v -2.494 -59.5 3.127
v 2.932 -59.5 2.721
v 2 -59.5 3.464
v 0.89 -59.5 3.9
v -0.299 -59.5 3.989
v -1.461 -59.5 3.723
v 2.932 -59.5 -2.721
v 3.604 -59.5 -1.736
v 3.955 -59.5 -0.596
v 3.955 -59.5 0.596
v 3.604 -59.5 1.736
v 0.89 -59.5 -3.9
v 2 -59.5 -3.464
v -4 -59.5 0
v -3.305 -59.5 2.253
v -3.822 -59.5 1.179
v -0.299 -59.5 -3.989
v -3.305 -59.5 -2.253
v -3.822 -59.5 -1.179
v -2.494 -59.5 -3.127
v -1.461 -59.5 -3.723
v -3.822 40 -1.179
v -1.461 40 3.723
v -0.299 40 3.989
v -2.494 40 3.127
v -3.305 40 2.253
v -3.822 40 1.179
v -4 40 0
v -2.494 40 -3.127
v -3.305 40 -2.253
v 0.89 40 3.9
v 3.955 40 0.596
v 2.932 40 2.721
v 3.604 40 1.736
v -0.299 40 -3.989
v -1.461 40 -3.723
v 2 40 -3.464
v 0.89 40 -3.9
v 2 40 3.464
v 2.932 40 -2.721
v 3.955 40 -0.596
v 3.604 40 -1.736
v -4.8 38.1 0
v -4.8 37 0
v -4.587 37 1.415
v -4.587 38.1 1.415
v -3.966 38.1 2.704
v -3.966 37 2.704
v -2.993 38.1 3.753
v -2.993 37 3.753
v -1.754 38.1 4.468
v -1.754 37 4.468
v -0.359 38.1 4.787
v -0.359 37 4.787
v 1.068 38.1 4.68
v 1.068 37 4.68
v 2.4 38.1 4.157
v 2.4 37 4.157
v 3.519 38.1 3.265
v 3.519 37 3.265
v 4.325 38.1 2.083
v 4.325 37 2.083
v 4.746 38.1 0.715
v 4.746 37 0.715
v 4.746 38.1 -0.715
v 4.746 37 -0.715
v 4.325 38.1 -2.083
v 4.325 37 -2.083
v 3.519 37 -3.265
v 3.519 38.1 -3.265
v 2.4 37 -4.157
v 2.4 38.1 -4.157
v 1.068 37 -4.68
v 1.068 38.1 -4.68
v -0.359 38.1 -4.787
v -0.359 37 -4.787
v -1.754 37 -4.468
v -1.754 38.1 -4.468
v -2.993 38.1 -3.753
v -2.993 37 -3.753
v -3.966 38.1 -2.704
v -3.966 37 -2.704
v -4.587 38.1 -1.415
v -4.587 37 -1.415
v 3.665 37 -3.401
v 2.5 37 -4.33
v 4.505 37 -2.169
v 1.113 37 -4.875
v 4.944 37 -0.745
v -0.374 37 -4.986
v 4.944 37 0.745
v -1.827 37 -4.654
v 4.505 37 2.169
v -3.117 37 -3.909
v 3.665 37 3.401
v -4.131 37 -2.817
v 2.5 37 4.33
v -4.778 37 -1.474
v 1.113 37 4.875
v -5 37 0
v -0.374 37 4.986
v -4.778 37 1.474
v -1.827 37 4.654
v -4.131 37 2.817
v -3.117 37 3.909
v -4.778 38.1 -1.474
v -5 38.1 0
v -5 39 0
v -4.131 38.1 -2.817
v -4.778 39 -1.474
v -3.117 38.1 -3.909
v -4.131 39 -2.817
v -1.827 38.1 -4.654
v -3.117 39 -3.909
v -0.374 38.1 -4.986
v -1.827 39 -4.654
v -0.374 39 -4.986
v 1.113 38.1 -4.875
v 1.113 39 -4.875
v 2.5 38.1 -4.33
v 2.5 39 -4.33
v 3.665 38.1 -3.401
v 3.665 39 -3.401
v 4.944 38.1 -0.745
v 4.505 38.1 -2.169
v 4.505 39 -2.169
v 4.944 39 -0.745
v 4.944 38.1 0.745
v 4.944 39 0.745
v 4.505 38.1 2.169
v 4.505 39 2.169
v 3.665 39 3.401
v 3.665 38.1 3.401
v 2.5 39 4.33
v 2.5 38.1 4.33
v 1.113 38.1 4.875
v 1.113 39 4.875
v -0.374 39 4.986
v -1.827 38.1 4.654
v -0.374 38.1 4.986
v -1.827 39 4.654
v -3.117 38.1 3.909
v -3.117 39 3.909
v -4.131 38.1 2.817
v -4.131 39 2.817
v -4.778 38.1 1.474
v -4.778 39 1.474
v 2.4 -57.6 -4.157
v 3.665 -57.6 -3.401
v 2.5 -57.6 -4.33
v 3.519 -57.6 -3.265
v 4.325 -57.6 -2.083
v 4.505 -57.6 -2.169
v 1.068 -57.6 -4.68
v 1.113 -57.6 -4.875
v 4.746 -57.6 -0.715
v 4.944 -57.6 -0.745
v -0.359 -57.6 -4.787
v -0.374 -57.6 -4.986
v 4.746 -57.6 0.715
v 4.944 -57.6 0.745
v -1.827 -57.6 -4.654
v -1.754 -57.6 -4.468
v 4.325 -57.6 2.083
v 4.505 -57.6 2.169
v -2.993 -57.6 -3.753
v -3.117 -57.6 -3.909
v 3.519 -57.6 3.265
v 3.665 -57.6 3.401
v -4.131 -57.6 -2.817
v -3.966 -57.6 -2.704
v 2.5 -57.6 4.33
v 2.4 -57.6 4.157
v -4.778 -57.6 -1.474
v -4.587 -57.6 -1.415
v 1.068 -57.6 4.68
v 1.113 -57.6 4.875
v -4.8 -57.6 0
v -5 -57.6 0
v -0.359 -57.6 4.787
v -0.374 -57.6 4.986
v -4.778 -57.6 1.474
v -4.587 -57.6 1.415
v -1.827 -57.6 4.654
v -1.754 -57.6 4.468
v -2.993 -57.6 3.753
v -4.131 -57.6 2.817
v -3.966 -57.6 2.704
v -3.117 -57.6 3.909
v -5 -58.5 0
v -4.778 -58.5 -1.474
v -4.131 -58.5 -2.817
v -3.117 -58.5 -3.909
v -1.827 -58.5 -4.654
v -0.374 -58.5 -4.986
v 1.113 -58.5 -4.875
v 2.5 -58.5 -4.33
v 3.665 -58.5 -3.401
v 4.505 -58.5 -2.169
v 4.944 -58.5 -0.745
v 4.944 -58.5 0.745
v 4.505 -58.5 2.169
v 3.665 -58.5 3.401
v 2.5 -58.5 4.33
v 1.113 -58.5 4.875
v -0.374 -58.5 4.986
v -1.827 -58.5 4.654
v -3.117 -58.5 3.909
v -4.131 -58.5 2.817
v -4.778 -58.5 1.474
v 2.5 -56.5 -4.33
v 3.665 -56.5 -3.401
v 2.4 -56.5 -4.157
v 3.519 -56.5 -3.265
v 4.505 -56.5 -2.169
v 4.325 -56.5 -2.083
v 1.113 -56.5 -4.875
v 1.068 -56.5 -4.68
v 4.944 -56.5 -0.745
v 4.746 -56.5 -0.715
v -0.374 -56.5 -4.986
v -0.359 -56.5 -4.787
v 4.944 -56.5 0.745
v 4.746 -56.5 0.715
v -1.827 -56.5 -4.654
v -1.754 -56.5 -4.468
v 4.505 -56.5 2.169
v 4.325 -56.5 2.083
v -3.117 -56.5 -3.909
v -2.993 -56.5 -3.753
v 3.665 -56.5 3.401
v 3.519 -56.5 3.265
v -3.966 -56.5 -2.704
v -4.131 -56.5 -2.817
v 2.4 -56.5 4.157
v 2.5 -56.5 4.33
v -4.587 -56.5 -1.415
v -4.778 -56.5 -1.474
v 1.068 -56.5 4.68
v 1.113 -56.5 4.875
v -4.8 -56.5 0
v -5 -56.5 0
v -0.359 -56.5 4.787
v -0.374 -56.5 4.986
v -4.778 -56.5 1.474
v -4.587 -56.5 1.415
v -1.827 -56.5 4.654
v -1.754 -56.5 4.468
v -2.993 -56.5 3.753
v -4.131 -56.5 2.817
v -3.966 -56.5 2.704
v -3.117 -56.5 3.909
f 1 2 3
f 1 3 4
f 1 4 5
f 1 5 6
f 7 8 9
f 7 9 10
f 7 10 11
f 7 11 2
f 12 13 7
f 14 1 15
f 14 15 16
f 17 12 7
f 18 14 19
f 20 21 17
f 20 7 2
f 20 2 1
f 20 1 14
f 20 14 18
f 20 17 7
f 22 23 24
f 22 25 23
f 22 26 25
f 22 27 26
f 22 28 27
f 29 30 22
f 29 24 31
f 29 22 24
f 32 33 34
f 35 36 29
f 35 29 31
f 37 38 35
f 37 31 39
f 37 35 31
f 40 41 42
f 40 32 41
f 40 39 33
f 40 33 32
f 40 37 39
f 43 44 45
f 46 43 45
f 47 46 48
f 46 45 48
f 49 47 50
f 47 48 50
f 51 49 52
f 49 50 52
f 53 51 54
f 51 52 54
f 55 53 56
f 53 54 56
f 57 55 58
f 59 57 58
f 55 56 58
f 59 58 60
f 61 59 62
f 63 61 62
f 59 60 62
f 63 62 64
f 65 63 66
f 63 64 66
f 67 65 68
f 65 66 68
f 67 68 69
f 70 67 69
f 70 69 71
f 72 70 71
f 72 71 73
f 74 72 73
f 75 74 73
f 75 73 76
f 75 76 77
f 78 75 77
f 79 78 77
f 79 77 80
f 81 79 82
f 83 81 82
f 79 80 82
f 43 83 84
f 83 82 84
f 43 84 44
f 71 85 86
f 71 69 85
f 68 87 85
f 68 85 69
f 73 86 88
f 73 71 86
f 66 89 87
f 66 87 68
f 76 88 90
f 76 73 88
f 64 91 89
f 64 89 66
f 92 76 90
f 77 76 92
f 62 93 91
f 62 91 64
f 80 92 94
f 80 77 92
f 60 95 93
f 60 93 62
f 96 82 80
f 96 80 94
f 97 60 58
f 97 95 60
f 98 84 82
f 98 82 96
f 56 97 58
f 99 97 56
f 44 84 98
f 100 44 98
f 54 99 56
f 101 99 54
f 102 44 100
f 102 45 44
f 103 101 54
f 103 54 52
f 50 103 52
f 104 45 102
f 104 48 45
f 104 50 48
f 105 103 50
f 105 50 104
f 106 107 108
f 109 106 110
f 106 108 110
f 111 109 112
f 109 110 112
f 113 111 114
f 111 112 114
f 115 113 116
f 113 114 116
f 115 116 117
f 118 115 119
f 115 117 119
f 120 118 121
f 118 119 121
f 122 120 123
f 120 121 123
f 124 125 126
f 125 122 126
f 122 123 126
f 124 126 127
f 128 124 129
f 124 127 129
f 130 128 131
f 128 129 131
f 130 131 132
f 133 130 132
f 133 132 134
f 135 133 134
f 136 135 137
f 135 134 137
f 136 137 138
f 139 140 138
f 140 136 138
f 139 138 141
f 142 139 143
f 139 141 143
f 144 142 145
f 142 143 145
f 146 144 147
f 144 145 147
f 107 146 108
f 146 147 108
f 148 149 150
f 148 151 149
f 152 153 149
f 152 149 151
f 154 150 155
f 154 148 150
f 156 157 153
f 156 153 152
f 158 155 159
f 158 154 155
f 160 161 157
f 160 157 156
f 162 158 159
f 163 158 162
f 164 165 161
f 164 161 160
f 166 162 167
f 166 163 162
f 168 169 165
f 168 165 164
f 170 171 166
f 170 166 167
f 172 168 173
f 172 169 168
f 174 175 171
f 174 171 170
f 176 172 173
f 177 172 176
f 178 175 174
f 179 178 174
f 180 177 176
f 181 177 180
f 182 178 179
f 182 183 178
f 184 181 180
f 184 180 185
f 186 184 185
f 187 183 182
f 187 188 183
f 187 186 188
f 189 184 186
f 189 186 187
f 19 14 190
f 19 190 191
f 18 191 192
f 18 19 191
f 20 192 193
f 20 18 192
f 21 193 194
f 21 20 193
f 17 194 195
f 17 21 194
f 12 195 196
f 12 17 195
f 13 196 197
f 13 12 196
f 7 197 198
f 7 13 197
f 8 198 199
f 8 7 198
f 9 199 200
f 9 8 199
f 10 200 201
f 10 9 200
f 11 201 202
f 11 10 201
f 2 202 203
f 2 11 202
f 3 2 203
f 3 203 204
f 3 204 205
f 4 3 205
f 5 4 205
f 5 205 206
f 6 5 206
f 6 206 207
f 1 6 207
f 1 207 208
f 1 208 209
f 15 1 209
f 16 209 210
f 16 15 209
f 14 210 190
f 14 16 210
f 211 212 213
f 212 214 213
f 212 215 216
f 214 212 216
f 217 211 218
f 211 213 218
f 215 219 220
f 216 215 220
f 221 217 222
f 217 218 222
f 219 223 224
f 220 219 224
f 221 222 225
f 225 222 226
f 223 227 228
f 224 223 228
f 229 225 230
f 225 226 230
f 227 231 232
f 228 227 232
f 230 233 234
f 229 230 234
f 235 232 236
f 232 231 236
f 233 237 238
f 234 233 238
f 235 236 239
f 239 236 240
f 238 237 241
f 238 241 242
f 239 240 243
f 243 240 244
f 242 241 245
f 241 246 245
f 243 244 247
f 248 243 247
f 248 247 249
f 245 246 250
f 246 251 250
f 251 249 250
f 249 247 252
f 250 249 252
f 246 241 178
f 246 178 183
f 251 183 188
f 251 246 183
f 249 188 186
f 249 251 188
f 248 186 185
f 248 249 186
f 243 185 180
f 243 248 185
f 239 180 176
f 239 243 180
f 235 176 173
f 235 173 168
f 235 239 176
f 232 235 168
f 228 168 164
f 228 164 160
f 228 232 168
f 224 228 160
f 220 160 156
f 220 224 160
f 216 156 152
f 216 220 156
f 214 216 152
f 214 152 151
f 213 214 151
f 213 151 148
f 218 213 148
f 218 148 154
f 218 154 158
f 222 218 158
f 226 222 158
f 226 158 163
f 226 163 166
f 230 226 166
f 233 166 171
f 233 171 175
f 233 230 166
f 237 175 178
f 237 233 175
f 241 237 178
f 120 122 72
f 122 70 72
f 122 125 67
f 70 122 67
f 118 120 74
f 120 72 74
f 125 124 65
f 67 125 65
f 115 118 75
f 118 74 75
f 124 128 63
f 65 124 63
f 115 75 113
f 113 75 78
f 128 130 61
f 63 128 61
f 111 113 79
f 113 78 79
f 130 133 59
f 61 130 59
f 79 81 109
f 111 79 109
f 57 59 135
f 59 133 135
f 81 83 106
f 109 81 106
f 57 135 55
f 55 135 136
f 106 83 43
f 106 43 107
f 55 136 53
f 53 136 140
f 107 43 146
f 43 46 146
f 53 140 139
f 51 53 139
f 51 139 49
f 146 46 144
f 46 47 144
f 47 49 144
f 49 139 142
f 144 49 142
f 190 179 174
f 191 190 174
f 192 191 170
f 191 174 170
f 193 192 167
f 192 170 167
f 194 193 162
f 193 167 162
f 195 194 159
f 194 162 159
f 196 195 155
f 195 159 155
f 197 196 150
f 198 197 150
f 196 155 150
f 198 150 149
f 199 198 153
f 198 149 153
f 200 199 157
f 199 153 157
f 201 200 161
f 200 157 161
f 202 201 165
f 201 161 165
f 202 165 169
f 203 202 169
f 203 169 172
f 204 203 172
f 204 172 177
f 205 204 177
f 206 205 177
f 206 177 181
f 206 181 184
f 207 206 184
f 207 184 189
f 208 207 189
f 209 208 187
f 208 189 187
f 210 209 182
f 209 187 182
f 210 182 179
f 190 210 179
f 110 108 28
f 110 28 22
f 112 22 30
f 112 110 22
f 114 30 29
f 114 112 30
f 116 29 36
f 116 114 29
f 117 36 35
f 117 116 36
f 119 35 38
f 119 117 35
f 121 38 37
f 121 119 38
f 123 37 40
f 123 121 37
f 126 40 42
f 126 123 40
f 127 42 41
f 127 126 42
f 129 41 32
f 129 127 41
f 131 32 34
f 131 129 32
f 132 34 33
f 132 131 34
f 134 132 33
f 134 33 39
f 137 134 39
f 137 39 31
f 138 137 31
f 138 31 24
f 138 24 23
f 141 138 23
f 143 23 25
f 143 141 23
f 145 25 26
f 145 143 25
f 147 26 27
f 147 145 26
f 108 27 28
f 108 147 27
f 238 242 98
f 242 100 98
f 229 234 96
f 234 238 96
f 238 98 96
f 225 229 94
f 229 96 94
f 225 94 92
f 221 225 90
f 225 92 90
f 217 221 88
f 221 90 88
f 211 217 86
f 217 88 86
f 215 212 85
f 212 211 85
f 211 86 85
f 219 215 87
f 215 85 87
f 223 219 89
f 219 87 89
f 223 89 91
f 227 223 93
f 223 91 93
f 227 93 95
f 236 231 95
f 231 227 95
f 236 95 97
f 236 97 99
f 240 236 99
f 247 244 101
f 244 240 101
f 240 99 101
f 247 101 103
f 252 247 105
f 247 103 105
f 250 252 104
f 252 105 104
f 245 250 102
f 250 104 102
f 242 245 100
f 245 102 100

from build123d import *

# Parameters (mm, degrees)
CHAMFER_1_SIZE      = 1
CUT_EXTRUDE_START   = -3
SKETCH_2_R          = 5
SKETCH_2_R_2        = 4.8
CUT_EXTRUDE_1_DEPTH = 1.1


with BuildPart() as part:
    # 草图1 → 旋转1 (revolve)
    with BuildSketch(Plane.XY, mode=Mode.PRIVATE) as revolve_1_sk:
        Polygon((0, 40), (5, 40), (5, 30), (5, -49.5), (5, -59.5), (0, -59.5), align=None)
    revolve(revolve_1_sk.sketch.rotate(Axis((0, 40, 0), (0, -1, 0)), 180), axis=Axis((0, 40, 0), (0, -1, 0)))

    # 倒角1
    chamfer_1_edges = [part.edges().sort_by_distance(p)[0] for p in [
        (5, -59.5, 0),
        (5, 40, 0),
    ]]
    chamfer(chamfer_1_edges, length=CHAMFER_1_SIZE)

    # 草图2 → 切除-拉伸1 (cut)
    with BuildSketch(Plane(origin=(0, 40, 0), x_dir=(1, 0, 0), z_dir=(0, 1, 0)).offset(CUT_EXTRUDE_START)):
        with Locations(Location((0, 0, 0), (0, 0, 180))):
            Circle(SKETCH_2_R)
        with Locations(Location((0, 0, 0), (0, 0, 180))):
            Circle(SKETCH_2_R_2, mode=Mode.SUBTRACT)
    cut_extrude_1 = extrude(amount=CUT_EXTRUDE_1_DEPTH, mode=Mode.SUBTRACT)

    # 镜向1: 切除-拉伸1 across plane
    add(cut_extrude_1.mirror(Plane.ZX.offset(-9.75)), mode=Mode.SUBTRACT)


solid = part.part
